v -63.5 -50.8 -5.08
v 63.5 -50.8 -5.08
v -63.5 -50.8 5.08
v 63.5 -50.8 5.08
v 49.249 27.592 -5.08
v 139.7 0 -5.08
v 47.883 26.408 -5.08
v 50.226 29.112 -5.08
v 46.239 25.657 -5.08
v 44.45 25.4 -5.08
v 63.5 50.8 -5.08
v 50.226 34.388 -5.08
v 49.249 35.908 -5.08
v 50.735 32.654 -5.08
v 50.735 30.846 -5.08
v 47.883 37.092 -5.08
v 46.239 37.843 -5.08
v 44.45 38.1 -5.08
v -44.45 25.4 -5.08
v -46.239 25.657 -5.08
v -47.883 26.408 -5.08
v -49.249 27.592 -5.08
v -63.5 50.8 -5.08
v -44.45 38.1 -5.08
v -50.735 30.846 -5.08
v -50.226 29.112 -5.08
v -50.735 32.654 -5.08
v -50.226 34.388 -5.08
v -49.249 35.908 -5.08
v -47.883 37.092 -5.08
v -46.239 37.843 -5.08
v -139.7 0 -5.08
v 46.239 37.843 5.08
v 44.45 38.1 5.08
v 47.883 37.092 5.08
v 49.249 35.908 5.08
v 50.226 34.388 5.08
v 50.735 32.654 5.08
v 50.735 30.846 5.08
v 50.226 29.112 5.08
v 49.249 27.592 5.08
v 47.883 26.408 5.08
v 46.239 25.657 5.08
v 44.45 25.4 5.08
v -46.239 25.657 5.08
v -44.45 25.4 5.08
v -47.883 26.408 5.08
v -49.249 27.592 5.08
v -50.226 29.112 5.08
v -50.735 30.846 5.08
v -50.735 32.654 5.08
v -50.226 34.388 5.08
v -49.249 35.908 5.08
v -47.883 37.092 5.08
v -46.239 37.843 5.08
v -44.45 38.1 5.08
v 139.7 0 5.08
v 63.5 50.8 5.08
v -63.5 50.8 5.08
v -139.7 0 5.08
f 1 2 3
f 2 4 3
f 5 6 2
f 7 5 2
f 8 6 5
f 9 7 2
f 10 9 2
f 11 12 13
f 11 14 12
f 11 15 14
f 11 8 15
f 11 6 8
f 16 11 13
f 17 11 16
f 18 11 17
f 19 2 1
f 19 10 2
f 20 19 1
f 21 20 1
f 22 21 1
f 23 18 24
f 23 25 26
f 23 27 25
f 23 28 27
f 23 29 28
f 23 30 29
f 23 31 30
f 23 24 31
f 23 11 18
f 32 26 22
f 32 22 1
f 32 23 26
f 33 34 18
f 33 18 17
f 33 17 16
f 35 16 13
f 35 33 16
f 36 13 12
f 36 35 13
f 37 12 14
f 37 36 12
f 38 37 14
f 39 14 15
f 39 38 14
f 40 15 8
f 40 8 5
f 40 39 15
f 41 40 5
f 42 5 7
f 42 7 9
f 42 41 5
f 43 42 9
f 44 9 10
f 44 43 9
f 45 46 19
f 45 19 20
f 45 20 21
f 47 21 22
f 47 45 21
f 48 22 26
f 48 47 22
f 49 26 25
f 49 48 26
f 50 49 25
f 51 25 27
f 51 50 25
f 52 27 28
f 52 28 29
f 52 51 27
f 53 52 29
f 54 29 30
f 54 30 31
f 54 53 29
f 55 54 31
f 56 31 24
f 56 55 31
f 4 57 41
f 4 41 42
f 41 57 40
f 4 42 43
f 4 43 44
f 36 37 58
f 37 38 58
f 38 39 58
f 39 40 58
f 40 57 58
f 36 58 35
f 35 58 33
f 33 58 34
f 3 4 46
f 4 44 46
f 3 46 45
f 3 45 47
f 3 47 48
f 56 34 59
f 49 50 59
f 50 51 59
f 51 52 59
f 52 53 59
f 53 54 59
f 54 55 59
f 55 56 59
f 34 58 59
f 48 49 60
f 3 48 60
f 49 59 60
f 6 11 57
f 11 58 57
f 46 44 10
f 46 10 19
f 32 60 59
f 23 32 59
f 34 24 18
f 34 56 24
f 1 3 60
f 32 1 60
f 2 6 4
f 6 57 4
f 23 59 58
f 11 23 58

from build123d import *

# Parameters (mm, degrees)
BOSS_EXTRUDE1_DEPTH = 5.08


with BuildPart() as part:
    # Sketch1 → Boss-Extrude1 (new, symmetric)
    with BuildSketch(Plane.XY):
        Polygon((-63.5, 50.8), (63.5, 50.8), (139.7, 0), (63.5, -50.8), (-63.5, -50.8), (-139.7, 0), align=None)
        with BuildLine():
            Line((-44.45, 38.1), (44.45, 38.1))
            ThreePointArc((44.45, 38.1), (50.8, 31.75), (44.45, 25.4))
            Line((44.45, 25.4), (-44.45, 25.4))
            ThreePointArc((-44.45, 25.4), (-50.8, 31.75), (-44.45, 38.1))
        make_face(mode=Mode.SUBTRACT)
    extrude(amount=BOSS_EXTRUDE1_DEPTH, both=True)


solid = part.part
